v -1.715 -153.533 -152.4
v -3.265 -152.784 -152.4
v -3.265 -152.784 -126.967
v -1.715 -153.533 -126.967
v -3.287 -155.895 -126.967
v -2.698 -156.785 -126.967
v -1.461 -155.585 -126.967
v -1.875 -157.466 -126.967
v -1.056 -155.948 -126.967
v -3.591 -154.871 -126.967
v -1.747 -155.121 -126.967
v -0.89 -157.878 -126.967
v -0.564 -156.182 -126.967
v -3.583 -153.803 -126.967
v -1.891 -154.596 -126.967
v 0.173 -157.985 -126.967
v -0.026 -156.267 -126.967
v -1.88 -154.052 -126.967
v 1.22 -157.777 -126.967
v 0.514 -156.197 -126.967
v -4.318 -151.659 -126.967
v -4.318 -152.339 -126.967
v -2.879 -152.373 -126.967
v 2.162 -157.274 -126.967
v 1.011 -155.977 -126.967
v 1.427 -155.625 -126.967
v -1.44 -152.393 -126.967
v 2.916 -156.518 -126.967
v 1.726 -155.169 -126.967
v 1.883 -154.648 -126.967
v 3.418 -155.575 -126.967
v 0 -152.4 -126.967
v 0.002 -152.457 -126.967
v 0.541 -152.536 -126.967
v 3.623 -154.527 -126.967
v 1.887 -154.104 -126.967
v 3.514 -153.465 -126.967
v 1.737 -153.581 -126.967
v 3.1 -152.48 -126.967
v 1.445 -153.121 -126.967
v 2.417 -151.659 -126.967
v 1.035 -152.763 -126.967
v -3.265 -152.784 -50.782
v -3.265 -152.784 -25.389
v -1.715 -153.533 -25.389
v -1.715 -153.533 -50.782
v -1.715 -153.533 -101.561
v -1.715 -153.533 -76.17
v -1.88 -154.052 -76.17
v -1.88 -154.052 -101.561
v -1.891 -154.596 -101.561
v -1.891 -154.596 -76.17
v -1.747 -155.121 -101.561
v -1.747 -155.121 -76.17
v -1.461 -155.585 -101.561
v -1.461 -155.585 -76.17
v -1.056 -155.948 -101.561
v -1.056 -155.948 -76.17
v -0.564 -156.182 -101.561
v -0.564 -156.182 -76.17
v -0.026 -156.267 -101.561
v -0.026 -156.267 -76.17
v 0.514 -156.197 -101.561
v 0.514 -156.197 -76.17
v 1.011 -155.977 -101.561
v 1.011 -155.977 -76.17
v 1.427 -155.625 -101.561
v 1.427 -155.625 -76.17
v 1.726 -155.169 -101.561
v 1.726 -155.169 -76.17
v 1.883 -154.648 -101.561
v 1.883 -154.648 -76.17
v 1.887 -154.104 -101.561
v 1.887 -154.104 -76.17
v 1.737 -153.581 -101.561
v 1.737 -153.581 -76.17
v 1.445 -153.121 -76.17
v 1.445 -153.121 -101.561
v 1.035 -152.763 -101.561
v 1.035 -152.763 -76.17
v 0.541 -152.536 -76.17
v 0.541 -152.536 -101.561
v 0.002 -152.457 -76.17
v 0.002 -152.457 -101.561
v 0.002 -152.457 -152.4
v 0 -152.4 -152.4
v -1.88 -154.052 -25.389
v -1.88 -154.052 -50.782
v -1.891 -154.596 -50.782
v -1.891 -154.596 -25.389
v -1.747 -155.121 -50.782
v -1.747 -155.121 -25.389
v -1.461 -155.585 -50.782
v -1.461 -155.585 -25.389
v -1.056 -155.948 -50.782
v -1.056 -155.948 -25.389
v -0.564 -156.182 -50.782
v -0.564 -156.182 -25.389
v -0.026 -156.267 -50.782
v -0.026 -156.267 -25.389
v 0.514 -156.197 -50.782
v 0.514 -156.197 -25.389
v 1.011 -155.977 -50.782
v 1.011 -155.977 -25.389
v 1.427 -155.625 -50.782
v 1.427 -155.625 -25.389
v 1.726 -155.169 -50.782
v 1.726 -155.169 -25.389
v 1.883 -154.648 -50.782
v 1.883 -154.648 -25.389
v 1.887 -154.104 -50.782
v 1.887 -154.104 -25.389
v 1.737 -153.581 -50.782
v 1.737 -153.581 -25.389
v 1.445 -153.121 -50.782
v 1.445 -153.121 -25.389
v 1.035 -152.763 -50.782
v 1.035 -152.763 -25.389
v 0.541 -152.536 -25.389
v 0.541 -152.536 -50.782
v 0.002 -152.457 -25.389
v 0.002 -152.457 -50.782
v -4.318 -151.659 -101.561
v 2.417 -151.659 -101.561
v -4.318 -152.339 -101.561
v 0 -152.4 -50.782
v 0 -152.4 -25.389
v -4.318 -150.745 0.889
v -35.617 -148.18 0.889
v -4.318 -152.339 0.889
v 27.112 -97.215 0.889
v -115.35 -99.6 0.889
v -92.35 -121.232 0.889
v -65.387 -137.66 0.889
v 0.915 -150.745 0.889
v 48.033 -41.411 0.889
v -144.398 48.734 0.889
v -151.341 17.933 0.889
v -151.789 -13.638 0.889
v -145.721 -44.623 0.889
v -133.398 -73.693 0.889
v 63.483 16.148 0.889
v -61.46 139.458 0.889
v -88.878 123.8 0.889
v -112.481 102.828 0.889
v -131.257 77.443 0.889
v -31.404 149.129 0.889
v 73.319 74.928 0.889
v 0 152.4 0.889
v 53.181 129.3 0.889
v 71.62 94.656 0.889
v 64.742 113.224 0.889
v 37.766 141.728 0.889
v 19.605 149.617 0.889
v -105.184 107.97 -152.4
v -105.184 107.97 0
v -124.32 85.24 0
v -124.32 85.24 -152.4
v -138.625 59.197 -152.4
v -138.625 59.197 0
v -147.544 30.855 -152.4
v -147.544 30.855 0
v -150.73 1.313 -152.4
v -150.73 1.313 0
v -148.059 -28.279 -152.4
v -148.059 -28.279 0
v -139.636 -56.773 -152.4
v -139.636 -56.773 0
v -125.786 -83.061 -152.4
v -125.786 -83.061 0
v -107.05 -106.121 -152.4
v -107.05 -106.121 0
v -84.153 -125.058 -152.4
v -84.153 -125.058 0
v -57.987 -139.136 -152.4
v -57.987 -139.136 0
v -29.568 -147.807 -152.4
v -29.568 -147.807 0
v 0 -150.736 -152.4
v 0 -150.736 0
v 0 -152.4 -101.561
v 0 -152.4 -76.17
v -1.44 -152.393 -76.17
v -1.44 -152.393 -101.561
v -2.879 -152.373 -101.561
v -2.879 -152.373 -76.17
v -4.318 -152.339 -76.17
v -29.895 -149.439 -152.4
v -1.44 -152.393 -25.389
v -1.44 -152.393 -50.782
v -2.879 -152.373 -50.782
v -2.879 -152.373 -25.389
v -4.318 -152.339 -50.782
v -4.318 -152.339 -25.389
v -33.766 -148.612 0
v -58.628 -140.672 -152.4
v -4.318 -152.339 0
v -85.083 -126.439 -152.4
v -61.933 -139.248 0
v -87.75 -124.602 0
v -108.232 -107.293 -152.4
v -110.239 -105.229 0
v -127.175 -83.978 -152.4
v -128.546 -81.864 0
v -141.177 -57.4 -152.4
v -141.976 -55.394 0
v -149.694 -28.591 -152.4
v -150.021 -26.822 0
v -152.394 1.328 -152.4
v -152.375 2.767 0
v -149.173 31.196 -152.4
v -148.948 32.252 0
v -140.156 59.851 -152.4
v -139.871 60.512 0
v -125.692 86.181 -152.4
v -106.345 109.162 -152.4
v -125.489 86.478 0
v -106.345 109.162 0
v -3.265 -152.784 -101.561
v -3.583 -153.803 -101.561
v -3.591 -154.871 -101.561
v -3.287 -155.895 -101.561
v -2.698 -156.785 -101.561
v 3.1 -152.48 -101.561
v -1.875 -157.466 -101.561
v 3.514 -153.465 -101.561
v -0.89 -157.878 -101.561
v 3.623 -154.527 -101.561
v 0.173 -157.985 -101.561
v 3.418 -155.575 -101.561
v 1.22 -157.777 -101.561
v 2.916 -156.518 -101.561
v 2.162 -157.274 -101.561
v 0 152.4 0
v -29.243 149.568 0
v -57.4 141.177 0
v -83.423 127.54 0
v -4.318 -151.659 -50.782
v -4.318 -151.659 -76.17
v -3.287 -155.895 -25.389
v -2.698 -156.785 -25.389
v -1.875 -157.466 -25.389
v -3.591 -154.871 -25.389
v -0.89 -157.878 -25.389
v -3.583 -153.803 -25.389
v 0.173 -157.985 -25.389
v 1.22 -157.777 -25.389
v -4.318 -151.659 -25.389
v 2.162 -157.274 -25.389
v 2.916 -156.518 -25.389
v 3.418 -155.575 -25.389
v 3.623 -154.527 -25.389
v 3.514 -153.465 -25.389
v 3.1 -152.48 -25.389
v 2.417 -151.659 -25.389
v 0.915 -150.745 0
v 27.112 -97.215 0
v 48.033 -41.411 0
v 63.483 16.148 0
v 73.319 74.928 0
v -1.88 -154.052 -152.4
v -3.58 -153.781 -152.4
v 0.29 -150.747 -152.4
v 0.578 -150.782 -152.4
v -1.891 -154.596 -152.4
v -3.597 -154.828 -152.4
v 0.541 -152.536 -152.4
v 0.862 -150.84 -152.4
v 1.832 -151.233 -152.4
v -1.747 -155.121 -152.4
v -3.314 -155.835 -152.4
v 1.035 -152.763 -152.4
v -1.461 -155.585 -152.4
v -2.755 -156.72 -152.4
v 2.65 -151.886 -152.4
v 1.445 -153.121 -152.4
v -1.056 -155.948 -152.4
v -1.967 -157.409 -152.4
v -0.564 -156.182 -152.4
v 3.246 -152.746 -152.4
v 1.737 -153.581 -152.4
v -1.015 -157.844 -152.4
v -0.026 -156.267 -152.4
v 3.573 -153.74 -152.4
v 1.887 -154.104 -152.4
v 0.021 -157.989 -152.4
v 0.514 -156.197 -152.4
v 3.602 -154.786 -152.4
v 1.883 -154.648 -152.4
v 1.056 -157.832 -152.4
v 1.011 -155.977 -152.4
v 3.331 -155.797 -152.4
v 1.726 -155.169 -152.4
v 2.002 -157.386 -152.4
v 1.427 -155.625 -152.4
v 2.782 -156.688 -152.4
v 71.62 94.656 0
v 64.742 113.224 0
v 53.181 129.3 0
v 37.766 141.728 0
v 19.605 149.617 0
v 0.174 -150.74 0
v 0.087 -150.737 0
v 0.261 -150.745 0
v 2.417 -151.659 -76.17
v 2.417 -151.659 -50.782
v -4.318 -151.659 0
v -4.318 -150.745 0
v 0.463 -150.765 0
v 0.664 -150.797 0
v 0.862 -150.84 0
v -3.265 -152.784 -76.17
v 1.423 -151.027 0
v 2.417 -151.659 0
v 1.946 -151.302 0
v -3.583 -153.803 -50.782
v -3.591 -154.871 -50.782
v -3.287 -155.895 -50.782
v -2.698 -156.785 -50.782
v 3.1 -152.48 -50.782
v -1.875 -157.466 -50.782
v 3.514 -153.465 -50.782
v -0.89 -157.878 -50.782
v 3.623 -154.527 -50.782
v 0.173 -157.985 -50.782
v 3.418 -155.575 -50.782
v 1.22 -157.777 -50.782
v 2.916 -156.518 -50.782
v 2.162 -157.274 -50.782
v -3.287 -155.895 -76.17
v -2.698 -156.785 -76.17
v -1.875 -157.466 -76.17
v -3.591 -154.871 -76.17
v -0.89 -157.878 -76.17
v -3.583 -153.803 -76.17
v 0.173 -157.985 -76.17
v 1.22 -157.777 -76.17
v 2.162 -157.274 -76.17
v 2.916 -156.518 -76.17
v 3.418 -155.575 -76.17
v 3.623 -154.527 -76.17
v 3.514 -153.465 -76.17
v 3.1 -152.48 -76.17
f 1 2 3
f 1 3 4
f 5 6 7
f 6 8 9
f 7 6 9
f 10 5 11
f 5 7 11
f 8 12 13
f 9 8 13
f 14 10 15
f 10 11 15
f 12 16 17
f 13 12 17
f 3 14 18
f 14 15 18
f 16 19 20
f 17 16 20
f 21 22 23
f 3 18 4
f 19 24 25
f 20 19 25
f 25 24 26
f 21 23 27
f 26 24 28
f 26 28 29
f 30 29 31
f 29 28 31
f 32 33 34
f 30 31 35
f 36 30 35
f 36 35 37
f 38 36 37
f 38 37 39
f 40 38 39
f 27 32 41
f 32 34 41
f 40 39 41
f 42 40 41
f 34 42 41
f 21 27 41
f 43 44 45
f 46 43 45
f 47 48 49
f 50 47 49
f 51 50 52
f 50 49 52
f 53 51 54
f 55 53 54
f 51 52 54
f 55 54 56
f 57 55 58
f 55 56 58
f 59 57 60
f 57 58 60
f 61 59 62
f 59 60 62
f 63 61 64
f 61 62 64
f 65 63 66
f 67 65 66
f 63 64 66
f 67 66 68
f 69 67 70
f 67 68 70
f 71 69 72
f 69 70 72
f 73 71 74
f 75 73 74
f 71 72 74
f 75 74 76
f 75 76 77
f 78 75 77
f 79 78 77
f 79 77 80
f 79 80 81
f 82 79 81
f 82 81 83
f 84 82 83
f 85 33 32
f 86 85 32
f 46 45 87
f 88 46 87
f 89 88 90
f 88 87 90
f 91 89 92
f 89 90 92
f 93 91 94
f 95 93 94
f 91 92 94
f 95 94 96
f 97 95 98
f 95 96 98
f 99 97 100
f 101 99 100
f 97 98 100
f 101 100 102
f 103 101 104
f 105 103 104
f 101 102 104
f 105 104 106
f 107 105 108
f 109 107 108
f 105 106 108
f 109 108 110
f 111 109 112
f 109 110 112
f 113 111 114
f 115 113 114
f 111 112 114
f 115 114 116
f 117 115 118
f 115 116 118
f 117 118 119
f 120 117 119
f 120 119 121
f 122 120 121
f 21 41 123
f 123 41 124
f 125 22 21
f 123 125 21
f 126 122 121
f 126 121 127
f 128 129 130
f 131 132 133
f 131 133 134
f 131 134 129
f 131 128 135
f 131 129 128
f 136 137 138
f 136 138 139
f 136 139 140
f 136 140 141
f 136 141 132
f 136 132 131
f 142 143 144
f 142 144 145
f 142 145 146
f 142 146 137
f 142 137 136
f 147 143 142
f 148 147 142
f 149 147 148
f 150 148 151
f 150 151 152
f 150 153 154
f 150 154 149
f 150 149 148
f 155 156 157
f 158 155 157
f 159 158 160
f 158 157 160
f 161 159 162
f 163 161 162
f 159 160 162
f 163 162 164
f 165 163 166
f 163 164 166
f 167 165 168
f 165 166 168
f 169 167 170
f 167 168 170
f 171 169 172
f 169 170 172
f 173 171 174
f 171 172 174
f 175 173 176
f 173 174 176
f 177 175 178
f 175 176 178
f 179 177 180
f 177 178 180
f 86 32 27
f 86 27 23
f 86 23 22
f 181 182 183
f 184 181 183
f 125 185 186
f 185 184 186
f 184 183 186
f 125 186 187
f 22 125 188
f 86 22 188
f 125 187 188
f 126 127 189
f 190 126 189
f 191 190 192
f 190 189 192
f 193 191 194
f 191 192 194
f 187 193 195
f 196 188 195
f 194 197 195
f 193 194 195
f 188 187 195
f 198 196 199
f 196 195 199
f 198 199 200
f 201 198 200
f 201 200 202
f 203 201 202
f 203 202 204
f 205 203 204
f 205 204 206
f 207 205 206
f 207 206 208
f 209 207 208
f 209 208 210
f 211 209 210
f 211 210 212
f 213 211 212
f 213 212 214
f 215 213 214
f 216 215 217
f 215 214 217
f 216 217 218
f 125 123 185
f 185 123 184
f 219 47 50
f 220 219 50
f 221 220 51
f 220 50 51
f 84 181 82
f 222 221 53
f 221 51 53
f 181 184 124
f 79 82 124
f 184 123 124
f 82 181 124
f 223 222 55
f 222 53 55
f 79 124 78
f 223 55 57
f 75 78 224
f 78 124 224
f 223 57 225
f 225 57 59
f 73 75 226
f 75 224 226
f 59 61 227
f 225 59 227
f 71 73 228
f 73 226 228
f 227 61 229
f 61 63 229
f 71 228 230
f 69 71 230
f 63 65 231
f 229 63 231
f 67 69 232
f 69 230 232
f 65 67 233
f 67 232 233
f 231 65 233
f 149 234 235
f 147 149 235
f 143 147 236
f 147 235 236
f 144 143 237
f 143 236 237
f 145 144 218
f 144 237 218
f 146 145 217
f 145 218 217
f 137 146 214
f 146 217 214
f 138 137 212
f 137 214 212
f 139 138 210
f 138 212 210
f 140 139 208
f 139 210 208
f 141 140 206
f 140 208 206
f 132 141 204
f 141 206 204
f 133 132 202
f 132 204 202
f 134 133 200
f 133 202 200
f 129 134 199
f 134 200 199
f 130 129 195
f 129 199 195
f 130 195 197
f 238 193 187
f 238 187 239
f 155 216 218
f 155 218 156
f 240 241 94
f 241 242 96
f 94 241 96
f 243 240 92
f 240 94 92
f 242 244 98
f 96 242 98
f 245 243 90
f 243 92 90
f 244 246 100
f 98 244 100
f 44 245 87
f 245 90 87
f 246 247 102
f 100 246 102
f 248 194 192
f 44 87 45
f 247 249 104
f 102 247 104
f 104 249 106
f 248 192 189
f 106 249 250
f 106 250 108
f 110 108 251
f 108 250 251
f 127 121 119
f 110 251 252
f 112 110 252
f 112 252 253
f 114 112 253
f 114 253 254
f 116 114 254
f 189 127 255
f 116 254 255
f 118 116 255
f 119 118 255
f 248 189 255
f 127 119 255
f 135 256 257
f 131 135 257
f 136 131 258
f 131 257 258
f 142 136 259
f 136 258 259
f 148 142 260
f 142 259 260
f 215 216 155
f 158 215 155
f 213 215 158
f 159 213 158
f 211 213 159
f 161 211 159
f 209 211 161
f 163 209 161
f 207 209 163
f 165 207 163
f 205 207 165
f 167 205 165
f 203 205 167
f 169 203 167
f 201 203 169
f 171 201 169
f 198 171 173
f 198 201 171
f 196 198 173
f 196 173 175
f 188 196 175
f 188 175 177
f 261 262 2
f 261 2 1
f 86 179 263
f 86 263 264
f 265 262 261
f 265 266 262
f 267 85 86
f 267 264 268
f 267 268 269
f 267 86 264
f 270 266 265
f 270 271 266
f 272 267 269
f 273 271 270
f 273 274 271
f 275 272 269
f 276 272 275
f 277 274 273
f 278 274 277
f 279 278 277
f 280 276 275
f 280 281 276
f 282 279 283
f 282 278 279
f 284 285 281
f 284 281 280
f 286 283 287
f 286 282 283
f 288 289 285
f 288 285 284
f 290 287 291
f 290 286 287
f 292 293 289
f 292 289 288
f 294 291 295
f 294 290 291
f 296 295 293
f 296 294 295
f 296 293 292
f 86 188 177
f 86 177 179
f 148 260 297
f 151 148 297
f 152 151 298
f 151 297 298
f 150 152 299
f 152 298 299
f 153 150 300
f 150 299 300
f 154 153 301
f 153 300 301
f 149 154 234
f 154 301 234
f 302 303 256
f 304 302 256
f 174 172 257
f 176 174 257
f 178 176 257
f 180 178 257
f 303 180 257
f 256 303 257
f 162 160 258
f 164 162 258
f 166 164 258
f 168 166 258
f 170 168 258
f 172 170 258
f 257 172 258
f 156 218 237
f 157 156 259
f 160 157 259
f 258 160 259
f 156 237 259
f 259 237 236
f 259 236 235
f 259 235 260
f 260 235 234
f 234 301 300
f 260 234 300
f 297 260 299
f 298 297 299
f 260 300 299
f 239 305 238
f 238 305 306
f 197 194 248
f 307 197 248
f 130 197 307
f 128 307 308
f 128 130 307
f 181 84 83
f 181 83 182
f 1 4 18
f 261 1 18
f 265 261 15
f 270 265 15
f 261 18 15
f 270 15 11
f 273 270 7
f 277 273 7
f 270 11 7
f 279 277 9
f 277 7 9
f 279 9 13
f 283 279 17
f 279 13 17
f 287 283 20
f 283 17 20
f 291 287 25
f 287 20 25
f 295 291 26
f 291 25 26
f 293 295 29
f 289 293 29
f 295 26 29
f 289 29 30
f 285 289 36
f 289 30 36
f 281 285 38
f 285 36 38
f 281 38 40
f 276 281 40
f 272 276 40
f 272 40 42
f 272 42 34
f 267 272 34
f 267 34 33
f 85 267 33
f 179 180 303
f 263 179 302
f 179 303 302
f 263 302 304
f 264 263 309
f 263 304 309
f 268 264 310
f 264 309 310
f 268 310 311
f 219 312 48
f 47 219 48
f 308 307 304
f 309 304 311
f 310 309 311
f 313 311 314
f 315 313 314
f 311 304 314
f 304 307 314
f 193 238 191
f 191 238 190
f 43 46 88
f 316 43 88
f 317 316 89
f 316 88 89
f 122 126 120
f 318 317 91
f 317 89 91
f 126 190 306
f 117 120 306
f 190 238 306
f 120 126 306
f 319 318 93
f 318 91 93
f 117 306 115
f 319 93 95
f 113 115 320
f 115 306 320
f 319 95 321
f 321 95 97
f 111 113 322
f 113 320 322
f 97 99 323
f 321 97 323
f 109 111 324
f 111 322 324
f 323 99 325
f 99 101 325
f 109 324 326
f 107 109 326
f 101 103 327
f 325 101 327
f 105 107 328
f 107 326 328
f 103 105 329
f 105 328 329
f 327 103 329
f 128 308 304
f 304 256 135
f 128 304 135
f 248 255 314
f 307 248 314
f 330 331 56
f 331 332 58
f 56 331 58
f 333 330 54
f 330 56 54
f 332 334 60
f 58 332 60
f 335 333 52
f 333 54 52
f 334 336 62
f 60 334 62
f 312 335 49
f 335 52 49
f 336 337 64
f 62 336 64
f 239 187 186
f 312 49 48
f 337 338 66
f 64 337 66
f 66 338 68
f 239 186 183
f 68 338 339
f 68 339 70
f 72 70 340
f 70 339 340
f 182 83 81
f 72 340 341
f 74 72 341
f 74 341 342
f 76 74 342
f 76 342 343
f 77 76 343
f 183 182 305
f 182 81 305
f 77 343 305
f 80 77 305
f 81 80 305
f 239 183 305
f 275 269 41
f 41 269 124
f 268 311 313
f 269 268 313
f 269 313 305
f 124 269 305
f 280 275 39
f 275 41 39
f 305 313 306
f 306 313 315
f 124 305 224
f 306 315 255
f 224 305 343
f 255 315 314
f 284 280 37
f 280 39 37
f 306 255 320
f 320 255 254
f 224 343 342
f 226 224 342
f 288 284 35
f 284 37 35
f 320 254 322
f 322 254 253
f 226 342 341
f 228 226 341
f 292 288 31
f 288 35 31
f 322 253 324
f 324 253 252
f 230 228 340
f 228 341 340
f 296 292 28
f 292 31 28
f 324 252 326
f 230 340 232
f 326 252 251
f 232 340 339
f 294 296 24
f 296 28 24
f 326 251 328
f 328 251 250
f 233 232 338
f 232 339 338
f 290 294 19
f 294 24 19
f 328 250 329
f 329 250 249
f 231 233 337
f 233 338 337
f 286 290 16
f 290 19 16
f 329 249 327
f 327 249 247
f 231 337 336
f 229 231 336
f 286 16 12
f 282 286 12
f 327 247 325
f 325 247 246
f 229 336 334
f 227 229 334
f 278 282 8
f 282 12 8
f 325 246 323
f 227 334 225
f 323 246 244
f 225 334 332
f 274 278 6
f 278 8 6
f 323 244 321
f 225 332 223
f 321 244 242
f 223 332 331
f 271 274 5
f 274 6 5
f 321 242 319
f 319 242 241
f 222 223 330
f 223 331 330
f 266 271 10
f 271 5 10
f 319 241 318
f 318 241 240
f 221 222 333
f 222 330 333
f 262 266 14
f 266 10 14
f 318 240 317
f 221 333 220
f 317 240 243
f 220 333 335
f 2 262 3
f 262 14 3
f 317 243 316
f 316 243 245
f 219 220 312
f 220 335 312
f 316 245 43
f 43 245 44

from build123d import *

# Parameters (mm, degrees)
F1_DEPTH = 0.889
F3_DEPTH = 152.4
F5_DEPTH = 4.318


with BuildPart() as f1:
    # F0 (on Top) → F1 (new body)
    with BuildSketch(Plane.XY):
        with BuildLine():
            ThreePointArc((73.319457, 74.928008), (53.181192, 129.299909), (0, 152.4))
            ThreePointArc((0, 152.4), (-152.4, 0), (0, -152.4))
            ThreePointArc((0, -152.4), (47.743568, -42.310835), (73.319457, 74.928008))
        make_face()
    extrude(amount=F1_DEPTH)

    # F2 (on face) → F3 (join)
    with BuildSketch(Plane(origin=(0, 0, 0), x_dir=(1, 0, 0), z_dir=(0, 0, -1))):
        with BuildLine():
            Line((0.001841, 152.457275), (0, 152.4))
            ThreePointArc((0, 152.4), (0.431777, 151.620209), (0.862429, 150.839797))
            ThreePointArc((0.862429, 150.839797), (1.545113, 157.643166), (-3.264828, 152.7835))
            Line((-3.264828, 152.7835), (-1.715005, 153.532948))
            ThreePointArc((-1.715005, 153.532948), (1.011435, 155.976592), (0.001841, 152.457275))
        make_face()
        with BuildLine():
            ThreePointArc((0.862429, 150.839797), (0.431777, 151.620209), (0, 152.4))
            ThreePointArc((0, 152.4), (-141.177371, 57.399564), (-106.345401, -109.162337))
            Line((-106.345401, -109.162337), (-105.184084, -107.970258))
            ThreePointArc((-105.184084, -107.970258), (-139.635681, 56.772747), (0, 150.735756))
            ThreePointArc((0, 150.735756), (0.434341, 150.76186), (0.862429, 150.839797))
        make_face()
    extrude(amount=F3_DEPTH)

    # F4 (on Right) → F5 (cut, symmetric)
    with BuildSketch(Plane.YZ):
        Polygon((-151.658967, 0), (-150.745168, 0), (-150.745168, 1.181528), (-161.246374, 1.181528), (-161.246374, 0), (-165.631473, 0), (-165.631473, -152.882606), (-161.246374, -152.882606), (-161.246374, -126.9674), (-151.658967, -126.9674), (-151.658967, -101.560883), (-161.246374, -101.560883), (-161.246374, -76.169804), (-151.658967, -76.169804), (-151.658967, -50.782207), (-161.246374, -50.782207), (-161.246374, -25.388533), (-151.658967, -25.388533), align=None)
    extrude(amount=F5_DEPTH, both=True, mode=Mode.SUBTRACT)


solid = f1.part
